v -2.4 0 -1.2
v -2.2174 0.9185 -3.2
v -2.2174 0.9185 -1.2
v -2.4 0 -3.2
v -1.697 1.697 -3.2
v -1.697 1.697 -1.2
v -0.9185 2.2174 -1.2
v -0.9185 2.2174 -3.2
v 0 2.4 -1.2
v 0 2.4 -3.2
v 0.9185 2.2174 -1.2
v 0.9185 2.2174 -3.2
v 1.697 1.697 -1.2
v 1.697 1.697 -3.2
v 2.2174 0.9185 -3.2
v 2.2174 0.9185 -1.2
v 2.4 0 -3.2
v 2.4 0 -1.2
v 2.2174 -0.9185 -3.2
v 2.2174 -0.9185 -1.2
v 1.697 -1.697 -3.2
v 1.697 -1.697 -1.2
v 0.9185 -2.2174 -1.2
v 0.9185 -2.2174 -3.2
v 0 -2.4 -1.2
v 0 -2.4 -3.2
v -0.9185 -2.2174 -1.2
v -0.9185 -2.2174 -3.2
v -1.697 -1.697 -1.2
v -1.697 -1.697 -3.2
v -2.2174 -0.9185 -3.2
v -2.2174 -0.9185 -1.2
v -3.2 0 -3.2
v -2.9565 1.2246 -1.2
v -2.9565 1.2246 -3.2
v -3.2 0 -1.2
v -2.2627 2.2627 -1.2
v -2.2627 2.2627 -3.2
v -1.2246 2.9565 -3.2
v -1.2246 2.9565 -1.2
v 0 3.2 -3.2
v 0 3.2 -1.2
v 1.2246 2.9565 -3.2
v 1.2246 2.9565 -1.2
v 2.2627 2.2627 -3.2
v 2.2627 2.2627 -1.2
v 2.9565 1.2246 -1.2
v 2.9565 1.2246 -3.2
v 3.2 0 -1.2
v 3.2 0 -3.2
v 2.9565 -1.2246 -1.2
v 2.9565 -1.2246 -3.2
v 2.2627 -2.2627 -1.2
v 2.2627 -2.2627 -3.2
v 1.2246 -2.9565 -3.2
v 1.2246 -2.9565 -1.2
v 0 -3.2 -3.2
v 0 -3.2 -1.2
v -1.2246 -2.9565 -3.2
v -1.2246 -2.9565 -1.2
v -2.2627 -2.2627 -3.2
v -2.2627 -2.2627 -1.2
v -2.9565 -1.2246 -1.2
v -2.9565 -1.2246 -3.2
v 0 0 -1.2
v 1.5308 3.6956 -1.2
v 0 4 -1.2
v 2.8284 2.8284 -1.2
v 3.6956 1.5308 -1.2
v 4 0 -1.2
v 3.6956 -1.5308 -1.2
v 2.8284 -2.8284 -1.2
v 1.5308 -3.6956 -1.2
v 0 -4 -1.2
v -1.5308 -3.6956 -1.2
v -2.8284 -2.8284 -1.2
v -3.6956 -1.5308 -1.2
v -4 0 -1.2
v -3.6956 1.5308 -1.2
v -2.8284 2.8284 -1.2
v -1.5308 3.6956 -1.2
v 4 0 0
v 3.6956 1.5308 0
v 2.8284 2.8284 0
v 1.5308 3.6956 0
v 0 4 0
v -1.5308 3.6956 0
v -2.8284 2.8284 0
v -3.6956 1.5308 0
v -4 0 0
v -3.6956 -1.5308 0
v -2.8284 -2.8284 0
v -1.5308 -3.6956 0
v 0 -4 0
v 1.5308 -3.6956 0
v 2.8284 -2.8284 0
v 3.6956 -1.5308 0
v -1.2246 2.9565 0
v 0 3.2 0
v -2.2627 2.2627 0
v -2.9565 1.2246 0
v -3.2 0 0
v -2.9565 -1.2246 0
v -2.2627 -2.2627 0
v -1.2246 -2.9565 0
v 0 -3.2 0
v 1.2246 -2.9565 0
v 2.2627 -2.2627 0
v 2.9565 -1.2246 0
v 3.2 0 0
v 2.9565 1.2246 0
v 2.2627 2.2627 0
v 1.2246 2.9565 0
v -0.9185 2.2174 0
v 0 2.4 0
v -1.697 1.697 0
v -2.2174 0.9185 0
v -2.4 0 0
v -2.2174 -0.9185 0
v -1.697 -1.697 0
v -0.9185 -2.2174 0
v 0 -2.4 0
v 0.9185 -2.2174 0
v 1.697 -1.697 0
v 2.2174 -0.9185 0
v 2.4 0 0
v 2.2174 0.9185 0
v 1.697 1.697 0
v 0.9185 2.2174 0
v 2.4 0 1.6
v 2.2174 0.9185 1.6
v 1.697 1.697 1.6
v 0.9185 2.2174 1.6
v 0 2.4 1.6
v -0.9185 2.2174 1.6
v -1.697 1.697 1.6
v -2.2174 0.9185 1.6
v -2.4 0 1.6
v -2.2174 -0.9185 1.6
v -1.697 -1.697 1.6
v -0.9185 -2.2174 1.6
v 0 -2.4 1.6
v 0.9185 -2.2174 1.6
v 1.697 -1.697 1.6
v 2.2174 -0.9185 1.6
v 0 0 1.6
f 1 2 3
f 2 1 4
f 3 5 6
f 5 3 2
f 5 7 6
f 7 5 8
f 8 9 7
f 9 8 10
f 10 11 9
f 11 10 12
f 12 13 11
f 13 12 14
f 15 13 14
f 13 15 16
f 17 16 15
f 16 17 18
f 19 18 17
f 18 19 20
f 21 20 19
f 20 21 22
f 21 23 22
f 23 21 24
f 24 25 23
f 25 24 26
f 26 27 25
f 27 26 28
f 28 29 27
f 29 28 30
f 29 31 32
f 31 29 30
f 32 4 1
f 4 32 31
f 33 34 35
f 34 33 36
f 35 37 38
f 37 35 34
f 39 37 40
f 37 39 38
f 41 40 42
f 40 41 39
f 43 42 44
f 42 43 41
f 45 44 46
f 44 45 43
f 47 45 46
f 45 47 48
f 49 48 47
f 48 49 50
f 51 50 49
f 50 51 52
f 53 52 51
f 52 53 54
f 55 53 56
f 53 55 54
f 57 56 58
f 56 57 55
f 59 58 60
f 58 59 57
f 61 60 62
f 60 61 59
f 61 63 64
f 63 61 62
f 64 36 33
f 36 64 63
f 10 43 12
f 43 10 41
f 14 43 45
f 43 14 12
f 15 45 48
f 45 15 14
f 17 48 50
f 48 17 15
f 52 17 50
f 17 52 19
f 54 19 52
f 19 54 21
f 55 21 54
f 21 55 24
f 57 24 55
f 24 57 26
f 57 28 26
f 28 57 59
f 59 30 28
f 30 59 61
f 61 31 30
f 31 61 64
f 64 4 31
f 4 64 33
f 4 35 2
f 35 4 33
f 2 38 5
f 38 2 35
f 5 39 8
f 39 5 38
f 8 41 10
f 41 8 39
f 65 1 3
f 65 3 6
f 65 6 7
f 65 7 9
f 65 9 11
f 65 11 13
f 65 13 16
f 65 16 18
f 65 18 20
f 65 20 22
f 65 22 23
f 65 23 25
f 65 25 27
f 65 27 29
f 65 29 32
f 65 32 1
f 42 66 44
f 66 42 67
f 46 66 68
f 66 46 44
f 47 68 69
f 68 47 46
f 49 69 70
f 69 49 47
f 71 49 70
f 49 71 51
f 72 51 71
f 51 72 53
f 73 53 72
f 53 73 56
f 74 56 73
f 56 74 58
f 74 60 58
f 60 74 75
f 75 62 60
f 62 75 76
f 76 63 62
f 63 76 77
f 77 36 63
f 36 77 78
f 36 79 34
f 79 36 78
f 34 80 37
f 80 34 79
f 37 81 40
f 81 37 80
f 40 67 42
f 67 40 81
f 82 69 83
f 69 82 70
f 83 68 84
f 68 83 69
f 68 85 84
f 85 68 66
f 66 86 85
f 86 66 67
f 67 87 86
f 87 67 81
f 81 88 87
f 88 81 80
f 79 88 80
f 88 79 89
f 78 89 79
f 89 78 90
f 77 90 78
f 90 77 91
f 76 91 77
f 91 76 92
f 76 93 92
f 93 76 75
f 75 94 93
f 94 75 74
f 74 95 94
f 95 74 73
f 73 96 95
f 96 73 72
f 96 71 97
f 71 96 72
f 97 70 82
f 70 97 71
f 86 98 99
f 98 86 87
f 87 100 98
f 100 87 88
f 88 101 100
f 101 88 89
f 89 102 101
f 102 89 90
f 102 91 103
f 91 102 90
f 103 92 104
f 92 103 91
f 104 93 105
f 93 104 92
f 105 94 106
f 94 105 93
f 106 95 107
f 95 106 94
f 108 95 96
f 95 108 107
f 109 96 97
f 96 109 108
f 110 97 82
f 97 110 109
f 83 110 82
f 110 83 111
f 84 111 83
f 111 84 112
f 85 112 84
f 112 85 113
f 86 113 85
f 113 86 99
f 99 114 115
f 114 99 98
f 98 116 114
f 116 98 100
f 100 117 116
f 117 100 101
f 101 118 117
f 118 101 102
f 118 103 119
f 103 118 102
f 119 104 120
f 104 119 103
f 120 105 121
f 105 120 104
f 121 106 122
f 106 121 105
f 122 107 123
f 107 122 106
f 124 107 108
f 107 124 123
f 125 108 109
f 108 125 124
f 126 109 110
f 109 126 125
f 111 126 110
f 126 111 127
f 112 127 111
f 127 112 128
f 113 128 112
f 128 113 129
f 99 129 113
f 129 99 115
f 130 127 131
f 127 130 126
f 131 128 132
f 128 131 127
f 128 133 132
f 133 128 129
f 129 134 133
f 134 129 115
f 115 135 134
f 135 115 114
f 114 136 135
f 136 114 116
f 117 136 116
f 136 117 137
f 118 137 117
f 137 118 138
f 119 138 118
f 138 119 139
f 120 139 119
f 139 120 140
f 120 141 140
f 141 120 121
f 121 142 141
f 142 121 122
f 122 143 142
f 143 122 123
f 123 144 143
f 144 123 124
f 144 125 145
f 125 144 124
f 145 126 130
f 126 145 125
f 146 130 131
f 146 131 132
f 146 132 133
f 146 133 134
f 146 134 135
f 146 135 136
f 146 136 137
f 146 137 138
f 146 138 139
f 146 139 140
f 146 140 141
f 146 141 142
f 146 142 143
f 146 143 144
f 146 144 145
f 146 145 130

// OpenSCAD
// file: ../p/4-4edge.scad
use <../lib.scad>
function ldraw_lib__4_4edge() = [
// 0 Circle 1.0
// 0 Name: 4-4edge.dat
// 0 Author: James Jessiman
// 0 !LDRAW_ORG Primitive UPDATE 2017-01
// 0 !LICENSE Licensed under CC BY 2.0 and CC BY 4.0 : see CAreadme.txt
// 
// 0 BFC CERTIFY CCW
  [0,"BFC","CERTIFY"],
  [0,"BFC","CCW"],
// 
// 0 !HISTORY 1998-12-15 [PTadmin] Official Update 1998-10
// 0 !HISTORY 2005-12-28 [PTadmin] Official Update 2005-01
// 0 !HISTORY 2007-06-24 [PTadmin] Header formatted for Contributor Agreement
// 0 !HISTORY 2008-07-01 [PTadmin] Official Update 2008-01
// 0 !HISTORY 2017-01-15 [Steffen] BFCed
// 0 !HISTORY 2017-12-30 [PTadmin] Official Update 2017-01
// 
// 
// 2 24 1 0 0 0.9239 0 0.3827
  [2,24,1,0,0,0.9239,0,0.3827],
// 2 24 0.9239 0 0.3827 0.7071 0 0.7071
  [2,24,0.9239,0,0.3827,0.7071,0,0.7071],
// 2 24 0.7071 0 0.7071 0.3827 0 0.9239
  [2,24,0.7071,0,0.7071,0.3827,0,0.9239],
// 2 24 0.3827 0 0.9239 0 0 1
  [2,24,0.3827,0,0.9239,0,0,1],
// 2 24 0 0 1 -0.3827 0 0.9239
  [2,24,0,0,1,-0.3827,0,0.9239],
// 2 24 -0.3827 0 0.9239 -0.7071 0 0.7071
  [2,24,-0.3827,0,0.9239,-0.7071,0,0.7071],
// 2 24 -0.7071 0 0.7071 -0.9239 0 0.3827
  [2,24,-0.7071,0,0.7071,-0.9239,0,0.3827],
// 2 24 -0.9239 0 0.3827 -1 0 -0
  [2,24,-0.9239,0,0.3827,-1,0,-0],
// 2 24 -1 0 -0 -0.9239 0 -0.3827
  [2,24,-1,0,-0,-0.9239,0,-0.3827],
// 2 24 -0.9239 0 -0.3827 -0.7071 0 -0.7071
  [2,24,-0.9239,0,-0.3827,-0.7071,0,-0.7071],
// 2 24 -0.7071 0 -0.7071 -0.3827 0 -0.9239
  [2,24,-0.7071,0,-0.7071,-0.3827,0,-0.9239],
// 2 24 -0.3827 0 -0.9239 0 0 -1
  [2,24,-0.3827,0,-0.9239,0,0,-1],
// 2 24 0 0 -1 0.3827 0 -0.9239
  [2,24,0,0,-1,0.3827,0,-0.9239],
// 2 24 0.3827 0 -0.9239 0.7071 0 -0.7071
  [2,24,0.3827,0,-0.9239,0.7071,0,-0.7071],
// 2 24 0.7071 0 -0.7071 0.9239 0 -0.3827
  [2,24,0.7071,0,-0.7071,0.9239,0,-0.3827],
// 2 24 0.9239 0 -0.3827 1 0 0
  [2,24,0.9239,0,-0.3827,1,0,0],
];
makepoly(ldraw_lib__4_4edge(), line=0.2);
// file: ../p/4-4cyli.scad
use <../lib.scad>
function ldraw_lib__4_4cyli() = [
// 0 Cylinder 1.0
// 0 Name: 4-4cyli.dat
// 0 Author: James Jessiman
// 0 !LDRAW_ORG Primitive UPDATE 2005-01
// 0 !LICENSE Licensed under CC BY 2.0 and CC BY 4.0 : see CAreadme.txt
// 
// 0 BFC CERTIFY CCW
  [0,"BFC","CERTIFY"],
  [0,"BFC","CCW"],
// 
// 0 !HISTORY 1998-12-15 [PTadmin] Official Update 1998-10
// 0 !HISTORY 2002-03-23 [sbliss] Added BFC statement; merged headers from files in distributions LDraw 0.27 and Complete.
// 0 !HISTORY 2002-04-25 [PTadmin] Official Update 2002-02
// 0 !HISTORY 2004-12-14 [guyvivan] BFC CCW
// 0 !HISTORY 2005-12-28 [PTadmin] Official Update 2005-01
// 0 !HISTORY 2007-06-24 [PTadmin] Header formatted for Contributor Agreement
// 0 !HISTORY 2008-07-01 [PTadmin] Official Update 2008-01
// 
// 
// 4 16 1 1 0 0.9239 1 0.3827 0.9239 0 0.3827 1 0 0
  [4,16,1,1,0,0.9239,1,0.3827,0.9239,0,0.3827,1,0,0],
// 5 24 1 0 0 1 1 0 0.9239 0 0.3827 0.9239 0 -0.3827
  [5,24,1,0,0,1,1,0,0.9239,0,0.3827,0.9239,0,-0.3827],
// 4 16 0.9239 1 0.3827 0.7071 1 0.7071 0.7071 0 0.7071 0.9239 0 0.3827
  [4,16,0.9239,1,0.3827,0.7071,1,0.7071,0.7071,0,0.7071,0.9239,0,0.3827],
// 5 24 0.9239 0 0.3827 0.9239 1 0.3827 0.7071 0 0.7071 1 0 0
  [5,24,0.9239,0,0.3827,0.9239,1,0.3827,0.7071,0,0.7071,1,0,0],
// 4 16 0.7071 1 0.7071 0.3827 1 0.9239 0.3827 0 0.9239 0.7071 0 0.7071
  [4,16,0.7071,1,0.7071,0.3827,1,0.9239,0.3827,0,0.9239,0.7071,0,0.7071],
// 5 24 0.7071 0 0.7071 0.7071 1 0.7071 0.3827 0 0.9239 0.9239 0 0.3827
  [5,24,0.7071,0,0.7071,0.7071,1,0.7071,0.3827,0,0.9239,0.9239,0,0.3827],
// 4 16 0.3827 1 0.9239 0 1 1 0 0 1 0.3827 0 0.9239
  [4,16,0.3827,1,0.9239,0,1,1,0,0,1,0.3827,0,0.9239],
// 5 24 0.3827 0 0.9239 0.3827 1 0.9239 0 0 1 0.7071 0 0.7071
  [5,24,0.3827,0,0.9239,0.3827,1,0.9239,0,0,1,0.7071,0,0.7071],
// 4 16 0 1 1 -0.3827 1 0.9239 -0.3827 0 0.9239 0 0 1
  [4,16,0,1,1,-0.3827,1,0.9239,-0.3827,0,0.9239,0,0,1],
// 5 24 0 0 1 0 1 1 -0.3827 0 0.9239 0.3827 0 0.9239
  [5,24,0,0,1,0,1,1,-0.3827,0,0.9239,0.3827,0,0.9239],
// 4 16 -0.3827 1 0.9239 -0.7071 1 0.7071 -0.7071 0 0.7071 -0.3827 0 0.9239
  [4,16,-0.3827,1,0.9239,-0.7071,1,0.7071,-0.7071,0,0.7071,-0.3827,0,0.9239],
// 5 24 -0.3827 0 0.9239 -0.3827 1 0.9239 -0.7071 0 0.7071 0 0 1
  [5,24,-0.3827,0,0.9239,-0.3827,1,0.9239,-0.7071,0,0.7071,0,0,1],
// 4 16 -0.7071 1 0.7071 -0.9239 1 0.3827 -0.9239 0 0.3827 -0.7071 0 0.7071
  [4,16,-0.7071,1,0.7071,-0.9239,1,0.3827,-0.9239,0,0.3827,-0.7071,0,0.7071],
// 5 24 -0.7071 0 0.7071 -0.7071 1 0.7071 -0.9239 0 0.3827 -0.3827 0 0.9239
  [5,24,-0.7071,0,0.7071,-0.7071,1,0.7071,-0.9239,0,0.3827,-0.3827,0,0.9239],
// 4 16 -0.9239 1 0.3827 -1 1 0 -1 0 0 -0.9239 0 0.3827
  [4,16,-0.9239,1,0.3827,-1,1,0,-1,0,0,-0.9239,0,0.3827],
// 5 24 -0.9239 0 0.3827 -0.9239 1 0.3827 -1 0 0 -0.7071 0 0.7071
  [5,24,-0.9239,0,0.3827,-0.9239,1,0.3827,-1,0,0,-0.7071,0,0.7071],
// 4 16 -1 1 0 -0.9239 1 -0.3827 -0.9239 0 -0.3827 -1 0 0
  [4,16,-1,1,0,-0.9239,1,-0.3827,-0.9239,0,-0.3827,-1,0,0],
// 5 24 -1 0 0 -1 1 0 -0.9239 0 -0.3827 -0.9239 0 0.3827
  [5,24,-1,0,0,-1,1,0,-0.9239,0,-0.3827,-0.9239,0,0.3827],
// 4 16 -0.9239 1 -0.3827 -0.7071 1 -0.7071 -0.7071 0 -0.7071 -0.9239 0 -0.3827
  [4,16,-0.9239,1,-0.3827,-0.7071,1,-0.7071,-0.7071,0,-0.7071,-0.9239,0,-0.3827],
// 5 24 -0.9239 0 -0.3827 -0.9239 1 -0.3827 -0.7071 0 -0.7071 -1 0 0
  [5,24,-0.9239,0,-0.3827,-0.9239,1,-0.3827,-0.7071,0,-0.7071,-1,0,0],
// 4 16 -0.7071 1 -0.7071 -0.3827 1 -0.9239 -0.3827 0 -0.9239 -0.7071 0 -0.7071
  [4,16,-0.7071,1,-0.7071,-0.3827,1,-0.9239,-0.3827,0,-0.9239,-0.7071,0,-0.7071],
// 5 24 -0.7071 0 -0.7071 -0.7071 1 -0.7071 -0.3827 0 -0.9239 -0.9239 0 -0.3827
  [5,24,-0.7071,0,-0.7071,-0.7071,1,-0.7071,-0.3827,0,-0.9239,-0.9239,0,-0.3827],
// 4 16 -0.3827 1 -0.9239 0 1 -1 0 0 -1 -0.3827 0 -0.9239
  [4,16,-0.3827,1,-0.9239,0,1,-1,0,0,-1,-0.3827,0,-0.9239],
// 5 24 -0.3827 0 -0.9239 -0.3827 1 -0.9239 0 0 -1 -0.7071 0 -0.7071
  [5,24,-0.3827,0,-0.9239,-0.3827,1,-0.9239,0,0,-1,-0.7071,0,-0.7071],
// 4 16 0 1 -1 0.3827 1 -0.9239 0.3827 0 -0.9239 0 0 -1
  [4,16,0,1,-1,0.3827,1,-0.9239,0.3827,0,-0.9239,0,0,-1],
// 5 24 0 0 -1 0 1 -1 0.3827 0 -0.9239 -0.3827 0 -0.9239
  [5,24,0,0,-1,0,1,-1,0.3827,0,-0.9239,-0.3827,0,-0.9239],
// 4 16 0.3827 1 -0.9239 0.7071 1 -0.7071 0.7071 0 -0.7071 0.3827 0 -0.9239
  [4,16,0.3827,1,-0.9239,0.7071,1,-0.7071,0.7071,0,-0.7071,0.3827,0,-0.9239],
// 5 24 0.3827 0 -0.9239 0.3827 1 -0.9239 0.7071 0 -0.7071 0 0 -1
  [5,24,0.3827,0,-0.9239,0.3827,1,-0.9239,0.7071,0,-0.7071,0,0,-1],
// 4 16 0.7071 1 -0.7071 0.9239 1 -0.3827 0.9239 0 -0.3827 0.7071 0 -0.7071
  [4,16,0.7071,1,-0.7071,0.9239,1,-0.3827,0.9239,0,-0.3827,0.7071,0,-0.7071],
// 5 24 0.7071 0 -0.7071 0.7071 1 -0.7071 0.9239 0 -0.3827 0.3827 0 -0.9239
  [5,24,0.7071,0,-0.7071,0.7071,1,-0.7071,0.9239,0,-0.3827,0.3827,0,-0.9239],
// 4 16 0.9239 1 -0.3827 1 1 0 1 0 0 0.9239 0 -0.3827
  [4,16,0.9239,1,-0.3827,1,1,0,1,0,0,0.9239,0,-0.3827],
// 5 24 0.9239 0 -0.3827 0.9239 1 -0.3827 1 0 0 0.7071 0 -0.7071
  [5,24,0.9239,0,-0.3827,0.9239,1,-0.3827,1,0,0,0.7071,0,-0.7071],
// 0
];
makepoly(ldraw_lib__4_4cyli(), line=0.2);
// file: ../p/stud4.scad
use <../lib.scad>
use <4-4cyli.scad>
use <4-4edge.scad>
use <4-4ring3.scad>
function ldraw_lib__stud4() = [
// 0 Stud Tube Open
// 0 Name: stud4.dat
// 0 Author: James Jessiman
// 0 !LDRAW_ORG Primitive UPDATE 2009-02
// 0 !LICENSE Licensed under CC BY 2.0 and CC BY 4.0 : see CAreadme.txt
// 
// 0 BFC CERTIFY CCW
  [0,"BFC","CERTIFY"],
  [0,"BFC","CCW"],
// 
// 0 !HISTORY 1999-07-05 [PTadmin] Official Update 1999-05
// 0 !HISTORY 2002-04-04 [sbliss] Modified for BFC compliance
// 0 !HISTORY 2002-04-25 [PTadmin] Official Update 2002-02
// 0 !HISTORY 2007-06-24 [PTadmin] Header formatted for Contributor Agreement
// 0 !HISTORY 2008-07-01 [PTadmin] Official Update 2008-01
// 0 !HISTORY 2009-06-21 [cwdee] Update ring references to 4-4ring
// 0 !HISTORY 2009-09-03 [PTadmin] Official Update 2009-02
// 
// 
// 1 16 0 -4 0 6 0 0 0 1 0 0 0 6 4-4edge.dat
  [1,16,0,-4,0,6,0,0,0,1,0,0,0,6, ldraw_lib__4_4edge()],
// 1 16 0 -4 0 8 0 0 0 1 0 0 0 8 4-4edge.dat
  [1,16,0,-4,0,8,0,0,0,1,0,0,0,8, ldraw_lib__4_4edge()],
// 1 16 0 0 0 6 0 0 0 1 0 0 0 6 4-4edge.dat
  [1,16,0,0,0,6,0,0,0,1,0,0,0,6, ldraw_lib__4_4edge()],
// 1 16 0 0 0 8 0 0 0 1 0 0 0 8 4-4edge.dat
  [1,16,0,0,0,8,0,0,0,1,0,0,0,8, ldraw_lib__4_4edge()],
// 0 BFC INVERTNEXT
  [0,"BFC","INVERTNEXT"],
// 1 16 0 -4 0 6 0 0 0 4 0 0 0 6 4-4cyli.dat
  [1,16,0,-4,0,6,0,0,0,4,0,0,0,6, ldraw_lib__4_4cyli()],
// 1 16 0 -4 0 8 0 0 0 4 0 0 0 8 4-4cyli.dat
  [1,16,0,-4,0,8,0,0,0,4,0,0,0,8, ldraw_lib__4_4cyli()],
// 1 16 0 -4 0 2 0 0 0 1 0 0 0 2 4-4ring3.dat
  [1,16,0,-4,0,2,0,0,0,1,0,0,0,2, ldraw_lib__4_4ring3()],
// 0
];
makepoly(ldraw_lib__stud4(), line=0.2);
// file: ../p/stud.scad
use <../lib.scad>
use <4-4cyli.scad>
use <4-4disc.scad>
use <4-4edge.scad>
function ldraw_lib__stud() = [
// 0 Stud
// 0 Name: stud.dat
// 0 Author: James Jessiman
// 0 !LDRAW_ORG Primitive UPDATE 2012-01
// 0 !LICENSE Licensed under CC BY 2.0 and CC BY 4.0 : see CAreadme.txt
// 
// 0 BFC CERTIFY CCW
  [0,"BFC","CERTIFY"],
  [0,"BFC","CCW"],
// 
// 0 !HISTORY 2002-04-04 [sbliss] Modified for BFC compliance
// 0 !HISTORY 2002-04-25 [PTadmin] Official Update 2002-02
// 0 !HISTORY 2007-06-24 [PTadmin] Header formatted for Contributor Agreement
// 0 !HISTORY 2008-07-01 [PTadmin] Official Update 2008-01
// 0 !HISTORY 2012-02-16 [Philo] Changed to CCW
// 0 !HISTORY 2012-03-30 [PTadmin] Official Update 2012-01
// 
// 
// 1 16 0 0 0 6 0 0 0 1 0 0 0 6 4-4edge.dat
  [1,16,0,0,0,6,0,0,0,1,0,0,0,6, ldraw_lib__4_4edge()],
// 1 16 0 -4 0 6 0 0 0 1 0 0 0 6 4-4edge.dat
  [1,16,0,-4,0,6,0,0,0,1,0,0,0,6, ldraw_lib__4_4edge()],
// 1 16 0 0 0 6 0 0 0 -4 0 0 0 6 4-4cyli.dat
  [1,16,0,0,0,6,0,0,0,-4,0,0,0,6, ldraw_lib__4_4cyli()],
// 1 16 0 -4 0 6 0 0 0 1 0 0 0 6 4-4disc.dat
  [1,16,0,-4,0,6,0,0,0,1,0,0,0,6, ldraw_lib__4_4disc()],
];
makepoly(ldraw_lib__stud(), line=0.2);
// file: ../p/4-4ring4.scad
use <../lib.scad>
function ldraw_lib__4_4ring4() = [
// 0 Ring  4 x 1.0
// 0 Name: 4-4ring4.dat
// 0 Author: James Jessiman
// 0 !LDRAW_ORG Primitive UPDATE 2009-01
// 0 !LICENSE Licensed under CC BY 2.0 and CC BY 4.0 : see CAreadme.txt
// 
// 0 BFC CERTIFY CCW
  [0,"BFC","CERTIFY"],
  [0,"BFC","CCW"],
// 
// 0 !HISTORY 1998-12-15 [PTadmin] Official Update 1998-10
// 0 !HISTORY 2002-04-08 [BrickCaster] Modified for BFC compliance
// 0 !HISTORY 2002-04-25 [PTadmin] Official Update 2002-02
// 0 !HISTORY 2007-06-24 [PTadmin] Header formatted for Contributor Agreement
// 0 !HISTORY 2008-07-01 [PTadmin] Official Update 2008-01
// 0 !HISTORY 2008-08-26 [cwdee] Switch polygon winding and rename
// 0 !HISTORY 2009-05-02 [PTadmin] Official Update 2009-01
// 
// 
// 4 16 -1.9135 0 4.6195 -1.5308 0 3.6956 0 0 4 0 0 5
  [4,16,-1.9135,0,4.6195,-1.5308,0,3.6956,0,0,4,0,0,5],
// 4 16 -3.5355 0 3.5355 -2.8284 0 2.8284 -1.5308 0 3.6956 -1.9135 0 4.6195
  [4,16,-3.5355,0,3.5355,-2.8284,0,2.8284,-1.5308,0,3.6956,-1.9135,0,4.6195],
// 4 16 -4.6195 0 1.9135 -3.6956 0 1.5308 -2.8284 0 2.8284 -3.5355 0 3.5355
  [4,16,-4.6195,0,1.9135,-3.6956,0,1.5308,-2.8284,0,2.8284,-3.5355,0,3.5355],
// 4 16 -5 0 0 -4 0 0 -3.6956 0 1.5308 -4.6195 0 1.9135
  [4,16,-5,0,0,-4,0,0,-3.6956,0,1.5308,-4.6195,0,1.9135],
// 4 16 -4.6195 0 -1.9135 -3.6956 0 -1.5308 -4 0 0 -5 0 0
  [4,16,-4.6195,0,-1.9135,-3.6956,0,-1.5308,-4,0,0,-5,0,0],
// 4 16 -3.5355 0 -3.5355 -2.8284 0 -2.8284 -3.6956 0 -1.5308 -4.6195 0 -1.9135
  [4,16,-3.5355,0,-3.5355,-2.8284,0,-2.8284,-3.6956,0,-1.5308,-4.6195,0,-1.9135],
// 4 16 -1.9135 0 -4.6195 -1.5308 0 -3.6956 -2.8284 0 -2.8284 -3.5355 0 -3.5355
  [4,16,-1.9135,0,-4.6195,-1.5308,0,-3.6956,-2.8284,0,-2.8284,-3.5355,0,-3.5355],
// 4 16 0 0 -5 0 0 -4 -1.5308 0 -3.6956 -1.9135 0 -4.6195
  [4,16,0,0,-5,0,0,-4,-1.5308,0,-3.6956,-1.9135,0,-4.6195],
// 4 16 1.9135 0 -4.6195 1.5308 0 -3.6956 0 0 -4 0 0 -5
  [4,16,1.9135,0,-4.6195,1.5308,0,-3.6956,0,0,-4,0,0,-5],
// 4 16 3.5355 0 -3.5355 2.8284 0 -2.8284 1.5308 0 -3.6956 1.9135 0 -4.6195
  [4,16,3.5355,0,-3.5355,2.8284,0,-2.8284,1.5308,0,-3.6956,1.9135,0,-4.6195],
// 4 16 4.6195 0 -1.9135 3.6956 0 -1.5308 2.8284 0 -2.8284 3.5355 0 -3.5355
  [4,16,4.6195,0,-1.9135,3.6956,0,-1.5308,2.8284,0,-2.8284,3.5355,0,-3.5355],
// 4 16 5 0 0 4 0 0 3.6956 0 -1.5308 4.6195 0 -1.9135
  [4,16,5,0,0,4,0,0,3.6956,0,-1.5308,4.6195,0,-1.9135],
// 4 16 4.6195 0 1.9135 3.6956 0 1.5308 4 0 0 5 0 0
  [4,16,4.6195,0,1.9135,3.6956,0,1.5308,4,0,0,5,0,0],
// 4 16 3.5355 0 3.5355 2.8284 0 2.8284 3.6956 0 1.5308 4.6195 0 1.9135
  [4,16,3.5355,0,3.5355,2.8284,0,2.8284,3.6956,0,1.5308,4.6195,0,1.9135],
// 4 16 1.9135 0 4.6195 1.5308 0 3.6956 2.8284 0 2.8284 3.5355 0 3.5355
  [4,16,1.9135,0,4.6195,1.5308,0,3.6956,2.8284,0,2.8284,3.5355,0,3.5355],
// 4 16 0 0 5 0 0 4 1.5308 0 3.6956 1.9135 0 4.6195
  [4,16,0,0,5,0,0,4,1.5308,0,3.6956,1.9135,0,4.6195],
// 0
];
makepoly(ldraw_lib__4_4ring4(), line=0.2);
// file: ../p/4-4ring3.scad
use <../lib.scad>
function ldraw_lib__4_4ring3() = [
// 0 Ring  3 x 1.0
// 0 Name: 4-4ring3.dat
// 0 Author: James Jessiman
// 0 !LDRAW_ORG Primitive UPDATE 2009-01
// 0 !LICENSE Licensed under CC BY 2.0 and CC BY 4.0 : see CAreadme.txt
// 
// 0 BFC CERTIFY CCW
  [0,"BFC","CERTIFY"],
  [0,"BFC","CCW"],
// 
// 0 !HISTORY 1998-12-15 [PTadmin] Official Update 1998-10
// 0 !HISTORY 2002-04-05 [hafhead] Added BFC statement
// 0 !HISTORY 2002-04-25 [PTadmin] Official Update 2002-02
// 0 !HISTORY 2007-06-24 [PTadmin] Header formatted for Contributor Agreement
// 0 !HISTORY 2008-07-01 [PTadmin] Official Update 2008-01
// 0 !HISTORY 2008-08-26 [cwdee] Switch polygon winding and rename
// 0 !HISTORY 2009-05-02 [PTadmin] Official Update 2009-01
// 
// 
// 4 16 -1.5308 0 3.6956 -1.1481 0 2.7717 0 0 3 0 0 4
  [4,16,-1.5308,0,3.6956,-1.1481,0,2.7717,0,0,3,0,0,4],
// 4 16 -2.8284 0 2.8284 -2.1213 0 2.1213 -1.1481 0 2.7717 -1.5308 0 3.6956
  [4,16,-2.8284,0,2.8284,-2.1213,0,2.1213,-1.1481,0,2.7717,-1.5308,0,3.6956],
// 4 16 -3.6956 0 1.5308 -2.7717 0 1.1481 -2.1213 0 2.1213 -2.8284 0 2.8284
  [4,16,-3.6956,0,1.5308,-2.7717,0,1.1481,-2.1213,0,2.1213,-2.8284,0,2.8284],
// 4 16 -4 0 0 -3 0 0 -2.7717 0 1.1481 -3.6956 0 1.5308
  [4,16,-4,0,0,-3,0,0,-2.7717,0,1.1481,-3.6956,0,1.5308],
// 4 16 -3.6956 0 -1.5308 -2.7717 0 -1.1481 -3 0 0 -4 0 0
  [4,16,-3.6956,0,-1.5308,-2.7717,0,-1.1481,-3,0,0,-4,0,0],
// 4 16 -2.8284 0 -2.8284 -2.1213 0 -2.1213 -2.7717 0 -1.1481 -3.6956 0 -1.5308
  [4,16,-2.8284,0,-2.8284,-2.1213,0,-2.1213,-2.7717,0,-1.1481,-3.6956,0,-1.5308],
// 4 16 -1.5308 0 -3.6956 -1.1481 0 -2.7717 -2.1213 0 -2.1213 -2.8284 0 -2.8284
  [4,16,-1.5308,0,-3.6956,-1.1481,0,-2.7717,-2.1213,0,-2.1213,-2.8284,0,-2.8284],
// 4 16 0 0 -4 0 0 -3 -1.1481 0 -2.7717 -1.5308 0 -3.6956
  [4,16,0,0,-4,0,0,-3,-1.1481,0,-2.7717,-1.5308,0,-3.6956],
// 4 16 1.5308 0 -3.6956 1.1481 0 -2.7717 0 0 -3 0 0 -4
  [4,16,1.5308,0,-3.6956,1.1481,0,-2.7717,0,0,-3,0,0,-4],
// 4 16 2.8284 0 -2.8284 2.1213 0 -2.1213 1.1481 0 -2.7717 1.5308 0 -3.6956
  [4,16,2.8284,0,-2.8284,2.1213,0,-2.1213,1.1481,0,-2.7717,1.5308,0,-3.6956],
// 4 16 3.6956 0 -1.5308 2.7717 0 -1.1481 2.1213 0 -2.1213 2.8284 0 -2.8284
  [4,16,3.6956,0,-1.5308,2.7717,0,-1.1481,2.1213,0,-2.1213,2.8284,0,-2.8284],
// 4 16 4 0 0 3 0 0 2.7717 0 -1.1481 3.6956 0 -1.5308
  [4,16,4,0,0,3,0,0,2.7717,0,-1.1481,3.6956,0,-1.5308],
// 4 16 3.6956 0 1.5308 2.7717 0 1.1481 3 0 0 4 0 0
  [4,16,3.6956,0,1.5308,2.7717,0,1.1481,3,0,0,4,0,0],
// 4 16 2.8284 0 2.8284 2.1213 0 2.1213 2.7717 0 1.1481 3.6956 0 1.5308
  [4,16,2.8284,0,2.8284,2.1213,0,2.1213,2.7717,0,1.1481,3.6956,0,1.5308],
// 4 16 1.5308 0 3.6956 1.1481 0 2.7717 2.1213 0 2.1213 2.8284 0 2.8284
  [4,16,1.5308,0,3.6956,1.1481,0,2.7717,2.1213,0,2.1213,2.8284,0,2.8284],
// 4 16 0 0 4 0 0 3 1.1481 0 2.7717 1.5308 0 3.6956
  [4,16,0,0,4,0,0,3,1.1481,0,2.7717,1.5308,0,3.6956],
// 0
];
makepoly(ldraw_lib__4_4ring3(), line=0.2);
// file: ../p/4-4disc.scad
use <../lib.scad>
function ldraw_lib__4_4disc() = [
// 0 Disc 1.0
// 0 Name: 4-4disc.dat
// 0 Author: James Jessiman
// 0 !LDRAW_ORG Primitive UPDATE 2002-02
// 0 !LICENSE Licensed under CC BY 2.0 and CC BY 4.0 : see CAreadme.txt
// 
// 0 BFC CERTIFY CCW
  [0,"BFC","CERTIFY"],
  [0,"BFC","CCW"],
// 
// 0 !HISTORY 1998-12-15 [PTadmin] Official Update 1998-10
// 0 !HISTORY 2002-03-23 [sbliss] Added BFC statement
// 0 !HISTORY 2002-04-25 [PTadmin] Official Update 2002-02
// 0 !HISTORY 2007-06-24 [PTadmin] Header formatted for Contributor Agreement
// 0 !HISTORY 2008-07-01 [PTadmin] Official Update 2008-01
// 
// 
// 3 16 0 0 0 1 0 0 0.9239 0 0.3827
  [3,16,0,0,0,1,0,0,0.9239,0,0.3827],
// 3 16 0 0 0 0.9239 0 0.3827 0.7071 0 0.7071
  [3,16,0,0,0,0.9239,0,0.3827,0.7071,0,0.7071],
// 3 16 0 0 0 0.7071 0 0.7071 0.3827 0 0.9239
  [3,16,0,0,0,0.7071,0,0.7071,0.3827,0,0.9239],
// 3 16 0 0 0 0.3827 0 0.9239 0 0 1
  [3,16,0,0,0,0.3827,0,0.9239,0,0,1],
// 3 16 0 0 0 0 0 1 -0.3827 0 0.9239
  [3,16,0,0,0,0,0,1,-0.3827,0,0.9239],
// 3 16 0 0 0 -0.3827 0 0.9239 -0.7071 0 0.7071
  [3,16,0,0,0,-0.3827,0,0.9239,-0.7071,0,0.7071],
// 3 16 0 0 0 -0.7071 0 0.7071 -0.9239 0 0.3827
  [3,16,0,0,0,-0.7071,0,0.7071,-0.9239,0,0.3827],
// 3 16 0 0 0 -0.9239 0 0.3827 -1 0 -0
  [3,16,0,0,0,-0.9239,0,0.3827,-1,0,-0],
// 3 16 0 0 0 -1 0 -0 -0.9239 0 -0.3827
  [3,16,0,0,0,-1,0,-0,-0.9239,0,-0.3827],
// 3 16 0 0 0 -0.9239 0 -0.3827 -0.7071 0 -0.7071
  [3,16,0,0,0,-0.9239,0,-0.3827,-0.7071,0,-0.7071],
// 3 16 0 0 0 -0.7071 0 -0.7071 -0.3827 0 -0.9239
  [3,16,0,0,0,-0.7071,0,-0.7071,-0.3827,0,-0.9239],
// 3 16 0 0 0 -0.3827 0 -0.9239 0 0 -1
  [3,16,0,0,0,-0.3827,0,-0.9239,0,0,-1],
// 3 16 0 0 0 0 0 -1 0.3827 0 -0.9239
  [3,16,0,0,0,0,0,-1,0.3827,0,-0.9239],
// 3 16 0 0 0 0.3827 0 -0.9239 0.7071 0 -0.7071
  [3,16,0,0,0,0.3827,0,-0.9239,0.7071,0,-0.7071],
// 3 16 0 0 0 0.7071 0 -0.7071 0.9239 0 -0.3827
  [3,16,0,0,0,0.7071,0,-0.7071,0.9239,0,-0.3827],
// 3 16 0 0 0 0.9239 0 -0.3827 1 0 0
  [3,16,0,0,0,0.9239,0,-0.3827,1,0,0],
// 0
];
makepoly(ldraw_lib__4_4disc(), line=0.2);
// file: ../p/4-4cylo.scad
use <../lib.scad>
use <4-4cyli.scad>
use <4-4edge.scad>
function ldraw_lib__4_4cylo() = [
// 0 Cylinder Open 1.0
// 0 Name: 4-4cylo.dat
// 0 Author: Mark Kennedy [mkennedy]
// 0 !LDRAW_ORG Primitive UPDATE 2010-01
// 0 !LICENSE Licensed under CC BY 2.0 and CC BY 4.0 : see CAreadme.txt
// 
// 0 BFC CERTIFY CCW
  [0,"BFC","CERTIFY"],
  [0,"BFC","CCW"],
// 
// 0 !HISTORY 2010-04-05 [PTadmin] Official Update 2010-01
// 
// 
// 1 16 0 0 0 1 0 0 0 1 0 0 0 1 4-4edge.dat
  [1,16,0,0,0,1,0,0,0,1,0,0,0,1, ldraw_lib__4_4edge()],
// 1 16 0 1 0 1 0 0 0 1 0 0 0 1 4-4edge.dat
  [1,16,0,1,0,1,0,0,0,1,0,0,0,1, ldraw_lib__4_4edge()],
// 1 16 0 0 0 1 0 0 0 1 0 0 0 1 4-4cyli.dat
  [1,16,0,0,0,1,0,0,0,1,0,0,0,1, ldraw_lib__4_4cyli()],
// 0
];
makepoly(ldraw_lib__4_4cylo(), line=0.2);
// file: 6141.scad
use <../lib.scad>
use <../p/4-4cylo.scad>
use <../p/4-4disc.scad>
use <../p/4-4ring3.scad>
use <../p/4-4ring4.scad>
use <../p/stud.scad>
use <../p/stud4.scad>
function ldraw_lib__6141() = [
// 0 Plate  1 x  1 Round
// 0 Name: 6141.dat
// 0 Author: James Jessiman
// 0 !LDRAW_ORG Part UPDATE 2015-01
// 0 !LICENSE Licensed under CC BY 2.0 and CC BY 4.0 : see CAreadme.txt
// 
// 0 BFC CERTIFY CCW
  [0,"BFC","CERTIFY"],
  [0,"BFC","CCW"],
// 
// 0 !HISTORY 1998-06-20 [PTadmin] Official Update 1998-06
// 0 !HISTORY 2003-01-29 [sbliss] Completed header; BFC'ed; misc cleanup
// 0 !HISTORY 2003-08-01 [PTadmin] Official Update 2003-02
// 0 !HISTORY 2007-10-26 [PTadmin] Header formatted for Contributor Agreement
// 0 !HISTORY 2008-07-01 [PTadmin] Official Update 2008-01
// 0 !HISTORY 2014-11-29 [Steffen] Renamed from 4073
// 0 !HISTORY 2014-12-28 [MagFors] Primitive substitution
// 0 !HISTORY 2015-10-11 [PTadmin] Official Update 2015-01
// 
// 
// 1 16 0 3 0 -1 0 0 0 -1.25 0 0 0 1 stud4.dat
  [1,16,0,3,0,-1,0,0,0,-1.25,0,0,0,1, ldraw_lib__stud4()],
// 1 16 0 3 0 -6 0 0 0 -1 0 0 0 6 4-4disc.dat
  [1,16,0,3,0,-6,0,0,0,-1,0,0,0,6, ldraw_lib__4_4disc()],
// 1 16 0 3 0 -2 0 0 0 -1 0 0 0 2 4-4ring4.dat
  [1,16,0,3,0,-2,0,0,0,-1,0,0,0,2, ldraw_lib__4_4ring4()],
// 1 16 0 0 0 10 0 0 0 3 0 0 0 10 4-4cylo.dat
  [1,16,0,0,0,10,0,0,0,3,0,0,0,10, ldraw_lib__4_4cylo()],
// 1 16 0 0 0 2 0 0 0 1 0 0 0 2 4-4ring4.dat
  [1,16,0,0,0,2,0,0,0,1,0,0,0,2, ldraw_lib__4_4ring4()],
// 1 16 0 0 0 2 0 0 0 1 0 0 0 2 4-4ring3.dat
  [1,16,0,0,0,2,0,0,0,1,0,0,0,2, ldraw_lib__4_4ring3()],
// 1 16 0 0 0 1 0 0 0 1 0 0 0 1 stud.dat
  [1,16,0,0,0,1,0,0,0,1,0,0,0,1, ldraw_lib__stud()],
];
makepoly(ldraw_lib__6141(), line=0.2);
// file: 4073.scad
use <../lib.scad>
use <6141.scad>
function ldraw_lib__4073() = [
// 0 ~Moved to 6141
// 0 Name: 4073.dat
// 0 Author: [PTadmin]
// 0 !LDRAW_ORG Part Alias UPDATE 2015-01
// 0 !LICENSE Licensed under CC BY 4.0 : see CAreadme.txt
// 
// 0 BFC CERTIFY CCW
  [0,"BFC","CERTIFY"],
  [0,"BFC","CCW"],
// 
// 0 !HISTORY 2015-10-11 [PTadmin] Official Update 2015-01
// 
// 
// 0 // Plate 1 x 1 Round
// 
// 1 16 0 0 0 1 0 0 0 1 0 0 0 1 6141.dat
  [1,16,0,0,0,1,0,0,0,1,0,0,0,1, ldraw_lib__6141()],
];
makepoly(ldraw_lib__4073(), line=0.2);
// main file
use <../lib.scad>
use <4073.scad>
function ldraw_lib__4210633() = [
// 0 ~_Plate  1 x  1 Round Dark Bluish Grey (Obsolete)
// 0 Name: 4210633.dat
// 0 Author: Michael Heidemann [mikeheide]
// 0 !LDRAW_ORG Part Physical_Colour UPDATE 2022-01
// 0 !LICENSE Licensed under CC BY 2.0 and CC BY 4.0 : see CAreadme.txt
// 
// 0 BFC CERTIFY CCW
  [0,"BFC","CERTIFY"],
  [0,"BFC","CCW"],
// 
// 0 !HISTORY 2010-12-31 [PTadmin] Official Update 2010-03
// 0 !HISTORY 2019-08-13 [Holly-Wood] Obsoleted per decision not to include physical colour parts
// 0 !HISTORY 2019-09-09 [PTadmin] Official Update 2019-02
// 0 !HISTORY 2021-01-16 [cwdee] Update description
// 0 !HISTORY 2022-01-14 [PTadmin] Official Update 2022-01
// 
// 
// 0 // This file is a "shortcut" with the correct number for the actual
// 0 // colouring of the part (Dark_Bluish_Grey).
// 
// 1 72 0 0 0 1 0 0 0 1 0 0 0 1 4073.dat
  [1,72,0,0,0,1,0,0,0,1,0,0,0,1, ldraw_lib__4073()],
];
makepoly(ldraw_lib__4210633(), line=0.2);
